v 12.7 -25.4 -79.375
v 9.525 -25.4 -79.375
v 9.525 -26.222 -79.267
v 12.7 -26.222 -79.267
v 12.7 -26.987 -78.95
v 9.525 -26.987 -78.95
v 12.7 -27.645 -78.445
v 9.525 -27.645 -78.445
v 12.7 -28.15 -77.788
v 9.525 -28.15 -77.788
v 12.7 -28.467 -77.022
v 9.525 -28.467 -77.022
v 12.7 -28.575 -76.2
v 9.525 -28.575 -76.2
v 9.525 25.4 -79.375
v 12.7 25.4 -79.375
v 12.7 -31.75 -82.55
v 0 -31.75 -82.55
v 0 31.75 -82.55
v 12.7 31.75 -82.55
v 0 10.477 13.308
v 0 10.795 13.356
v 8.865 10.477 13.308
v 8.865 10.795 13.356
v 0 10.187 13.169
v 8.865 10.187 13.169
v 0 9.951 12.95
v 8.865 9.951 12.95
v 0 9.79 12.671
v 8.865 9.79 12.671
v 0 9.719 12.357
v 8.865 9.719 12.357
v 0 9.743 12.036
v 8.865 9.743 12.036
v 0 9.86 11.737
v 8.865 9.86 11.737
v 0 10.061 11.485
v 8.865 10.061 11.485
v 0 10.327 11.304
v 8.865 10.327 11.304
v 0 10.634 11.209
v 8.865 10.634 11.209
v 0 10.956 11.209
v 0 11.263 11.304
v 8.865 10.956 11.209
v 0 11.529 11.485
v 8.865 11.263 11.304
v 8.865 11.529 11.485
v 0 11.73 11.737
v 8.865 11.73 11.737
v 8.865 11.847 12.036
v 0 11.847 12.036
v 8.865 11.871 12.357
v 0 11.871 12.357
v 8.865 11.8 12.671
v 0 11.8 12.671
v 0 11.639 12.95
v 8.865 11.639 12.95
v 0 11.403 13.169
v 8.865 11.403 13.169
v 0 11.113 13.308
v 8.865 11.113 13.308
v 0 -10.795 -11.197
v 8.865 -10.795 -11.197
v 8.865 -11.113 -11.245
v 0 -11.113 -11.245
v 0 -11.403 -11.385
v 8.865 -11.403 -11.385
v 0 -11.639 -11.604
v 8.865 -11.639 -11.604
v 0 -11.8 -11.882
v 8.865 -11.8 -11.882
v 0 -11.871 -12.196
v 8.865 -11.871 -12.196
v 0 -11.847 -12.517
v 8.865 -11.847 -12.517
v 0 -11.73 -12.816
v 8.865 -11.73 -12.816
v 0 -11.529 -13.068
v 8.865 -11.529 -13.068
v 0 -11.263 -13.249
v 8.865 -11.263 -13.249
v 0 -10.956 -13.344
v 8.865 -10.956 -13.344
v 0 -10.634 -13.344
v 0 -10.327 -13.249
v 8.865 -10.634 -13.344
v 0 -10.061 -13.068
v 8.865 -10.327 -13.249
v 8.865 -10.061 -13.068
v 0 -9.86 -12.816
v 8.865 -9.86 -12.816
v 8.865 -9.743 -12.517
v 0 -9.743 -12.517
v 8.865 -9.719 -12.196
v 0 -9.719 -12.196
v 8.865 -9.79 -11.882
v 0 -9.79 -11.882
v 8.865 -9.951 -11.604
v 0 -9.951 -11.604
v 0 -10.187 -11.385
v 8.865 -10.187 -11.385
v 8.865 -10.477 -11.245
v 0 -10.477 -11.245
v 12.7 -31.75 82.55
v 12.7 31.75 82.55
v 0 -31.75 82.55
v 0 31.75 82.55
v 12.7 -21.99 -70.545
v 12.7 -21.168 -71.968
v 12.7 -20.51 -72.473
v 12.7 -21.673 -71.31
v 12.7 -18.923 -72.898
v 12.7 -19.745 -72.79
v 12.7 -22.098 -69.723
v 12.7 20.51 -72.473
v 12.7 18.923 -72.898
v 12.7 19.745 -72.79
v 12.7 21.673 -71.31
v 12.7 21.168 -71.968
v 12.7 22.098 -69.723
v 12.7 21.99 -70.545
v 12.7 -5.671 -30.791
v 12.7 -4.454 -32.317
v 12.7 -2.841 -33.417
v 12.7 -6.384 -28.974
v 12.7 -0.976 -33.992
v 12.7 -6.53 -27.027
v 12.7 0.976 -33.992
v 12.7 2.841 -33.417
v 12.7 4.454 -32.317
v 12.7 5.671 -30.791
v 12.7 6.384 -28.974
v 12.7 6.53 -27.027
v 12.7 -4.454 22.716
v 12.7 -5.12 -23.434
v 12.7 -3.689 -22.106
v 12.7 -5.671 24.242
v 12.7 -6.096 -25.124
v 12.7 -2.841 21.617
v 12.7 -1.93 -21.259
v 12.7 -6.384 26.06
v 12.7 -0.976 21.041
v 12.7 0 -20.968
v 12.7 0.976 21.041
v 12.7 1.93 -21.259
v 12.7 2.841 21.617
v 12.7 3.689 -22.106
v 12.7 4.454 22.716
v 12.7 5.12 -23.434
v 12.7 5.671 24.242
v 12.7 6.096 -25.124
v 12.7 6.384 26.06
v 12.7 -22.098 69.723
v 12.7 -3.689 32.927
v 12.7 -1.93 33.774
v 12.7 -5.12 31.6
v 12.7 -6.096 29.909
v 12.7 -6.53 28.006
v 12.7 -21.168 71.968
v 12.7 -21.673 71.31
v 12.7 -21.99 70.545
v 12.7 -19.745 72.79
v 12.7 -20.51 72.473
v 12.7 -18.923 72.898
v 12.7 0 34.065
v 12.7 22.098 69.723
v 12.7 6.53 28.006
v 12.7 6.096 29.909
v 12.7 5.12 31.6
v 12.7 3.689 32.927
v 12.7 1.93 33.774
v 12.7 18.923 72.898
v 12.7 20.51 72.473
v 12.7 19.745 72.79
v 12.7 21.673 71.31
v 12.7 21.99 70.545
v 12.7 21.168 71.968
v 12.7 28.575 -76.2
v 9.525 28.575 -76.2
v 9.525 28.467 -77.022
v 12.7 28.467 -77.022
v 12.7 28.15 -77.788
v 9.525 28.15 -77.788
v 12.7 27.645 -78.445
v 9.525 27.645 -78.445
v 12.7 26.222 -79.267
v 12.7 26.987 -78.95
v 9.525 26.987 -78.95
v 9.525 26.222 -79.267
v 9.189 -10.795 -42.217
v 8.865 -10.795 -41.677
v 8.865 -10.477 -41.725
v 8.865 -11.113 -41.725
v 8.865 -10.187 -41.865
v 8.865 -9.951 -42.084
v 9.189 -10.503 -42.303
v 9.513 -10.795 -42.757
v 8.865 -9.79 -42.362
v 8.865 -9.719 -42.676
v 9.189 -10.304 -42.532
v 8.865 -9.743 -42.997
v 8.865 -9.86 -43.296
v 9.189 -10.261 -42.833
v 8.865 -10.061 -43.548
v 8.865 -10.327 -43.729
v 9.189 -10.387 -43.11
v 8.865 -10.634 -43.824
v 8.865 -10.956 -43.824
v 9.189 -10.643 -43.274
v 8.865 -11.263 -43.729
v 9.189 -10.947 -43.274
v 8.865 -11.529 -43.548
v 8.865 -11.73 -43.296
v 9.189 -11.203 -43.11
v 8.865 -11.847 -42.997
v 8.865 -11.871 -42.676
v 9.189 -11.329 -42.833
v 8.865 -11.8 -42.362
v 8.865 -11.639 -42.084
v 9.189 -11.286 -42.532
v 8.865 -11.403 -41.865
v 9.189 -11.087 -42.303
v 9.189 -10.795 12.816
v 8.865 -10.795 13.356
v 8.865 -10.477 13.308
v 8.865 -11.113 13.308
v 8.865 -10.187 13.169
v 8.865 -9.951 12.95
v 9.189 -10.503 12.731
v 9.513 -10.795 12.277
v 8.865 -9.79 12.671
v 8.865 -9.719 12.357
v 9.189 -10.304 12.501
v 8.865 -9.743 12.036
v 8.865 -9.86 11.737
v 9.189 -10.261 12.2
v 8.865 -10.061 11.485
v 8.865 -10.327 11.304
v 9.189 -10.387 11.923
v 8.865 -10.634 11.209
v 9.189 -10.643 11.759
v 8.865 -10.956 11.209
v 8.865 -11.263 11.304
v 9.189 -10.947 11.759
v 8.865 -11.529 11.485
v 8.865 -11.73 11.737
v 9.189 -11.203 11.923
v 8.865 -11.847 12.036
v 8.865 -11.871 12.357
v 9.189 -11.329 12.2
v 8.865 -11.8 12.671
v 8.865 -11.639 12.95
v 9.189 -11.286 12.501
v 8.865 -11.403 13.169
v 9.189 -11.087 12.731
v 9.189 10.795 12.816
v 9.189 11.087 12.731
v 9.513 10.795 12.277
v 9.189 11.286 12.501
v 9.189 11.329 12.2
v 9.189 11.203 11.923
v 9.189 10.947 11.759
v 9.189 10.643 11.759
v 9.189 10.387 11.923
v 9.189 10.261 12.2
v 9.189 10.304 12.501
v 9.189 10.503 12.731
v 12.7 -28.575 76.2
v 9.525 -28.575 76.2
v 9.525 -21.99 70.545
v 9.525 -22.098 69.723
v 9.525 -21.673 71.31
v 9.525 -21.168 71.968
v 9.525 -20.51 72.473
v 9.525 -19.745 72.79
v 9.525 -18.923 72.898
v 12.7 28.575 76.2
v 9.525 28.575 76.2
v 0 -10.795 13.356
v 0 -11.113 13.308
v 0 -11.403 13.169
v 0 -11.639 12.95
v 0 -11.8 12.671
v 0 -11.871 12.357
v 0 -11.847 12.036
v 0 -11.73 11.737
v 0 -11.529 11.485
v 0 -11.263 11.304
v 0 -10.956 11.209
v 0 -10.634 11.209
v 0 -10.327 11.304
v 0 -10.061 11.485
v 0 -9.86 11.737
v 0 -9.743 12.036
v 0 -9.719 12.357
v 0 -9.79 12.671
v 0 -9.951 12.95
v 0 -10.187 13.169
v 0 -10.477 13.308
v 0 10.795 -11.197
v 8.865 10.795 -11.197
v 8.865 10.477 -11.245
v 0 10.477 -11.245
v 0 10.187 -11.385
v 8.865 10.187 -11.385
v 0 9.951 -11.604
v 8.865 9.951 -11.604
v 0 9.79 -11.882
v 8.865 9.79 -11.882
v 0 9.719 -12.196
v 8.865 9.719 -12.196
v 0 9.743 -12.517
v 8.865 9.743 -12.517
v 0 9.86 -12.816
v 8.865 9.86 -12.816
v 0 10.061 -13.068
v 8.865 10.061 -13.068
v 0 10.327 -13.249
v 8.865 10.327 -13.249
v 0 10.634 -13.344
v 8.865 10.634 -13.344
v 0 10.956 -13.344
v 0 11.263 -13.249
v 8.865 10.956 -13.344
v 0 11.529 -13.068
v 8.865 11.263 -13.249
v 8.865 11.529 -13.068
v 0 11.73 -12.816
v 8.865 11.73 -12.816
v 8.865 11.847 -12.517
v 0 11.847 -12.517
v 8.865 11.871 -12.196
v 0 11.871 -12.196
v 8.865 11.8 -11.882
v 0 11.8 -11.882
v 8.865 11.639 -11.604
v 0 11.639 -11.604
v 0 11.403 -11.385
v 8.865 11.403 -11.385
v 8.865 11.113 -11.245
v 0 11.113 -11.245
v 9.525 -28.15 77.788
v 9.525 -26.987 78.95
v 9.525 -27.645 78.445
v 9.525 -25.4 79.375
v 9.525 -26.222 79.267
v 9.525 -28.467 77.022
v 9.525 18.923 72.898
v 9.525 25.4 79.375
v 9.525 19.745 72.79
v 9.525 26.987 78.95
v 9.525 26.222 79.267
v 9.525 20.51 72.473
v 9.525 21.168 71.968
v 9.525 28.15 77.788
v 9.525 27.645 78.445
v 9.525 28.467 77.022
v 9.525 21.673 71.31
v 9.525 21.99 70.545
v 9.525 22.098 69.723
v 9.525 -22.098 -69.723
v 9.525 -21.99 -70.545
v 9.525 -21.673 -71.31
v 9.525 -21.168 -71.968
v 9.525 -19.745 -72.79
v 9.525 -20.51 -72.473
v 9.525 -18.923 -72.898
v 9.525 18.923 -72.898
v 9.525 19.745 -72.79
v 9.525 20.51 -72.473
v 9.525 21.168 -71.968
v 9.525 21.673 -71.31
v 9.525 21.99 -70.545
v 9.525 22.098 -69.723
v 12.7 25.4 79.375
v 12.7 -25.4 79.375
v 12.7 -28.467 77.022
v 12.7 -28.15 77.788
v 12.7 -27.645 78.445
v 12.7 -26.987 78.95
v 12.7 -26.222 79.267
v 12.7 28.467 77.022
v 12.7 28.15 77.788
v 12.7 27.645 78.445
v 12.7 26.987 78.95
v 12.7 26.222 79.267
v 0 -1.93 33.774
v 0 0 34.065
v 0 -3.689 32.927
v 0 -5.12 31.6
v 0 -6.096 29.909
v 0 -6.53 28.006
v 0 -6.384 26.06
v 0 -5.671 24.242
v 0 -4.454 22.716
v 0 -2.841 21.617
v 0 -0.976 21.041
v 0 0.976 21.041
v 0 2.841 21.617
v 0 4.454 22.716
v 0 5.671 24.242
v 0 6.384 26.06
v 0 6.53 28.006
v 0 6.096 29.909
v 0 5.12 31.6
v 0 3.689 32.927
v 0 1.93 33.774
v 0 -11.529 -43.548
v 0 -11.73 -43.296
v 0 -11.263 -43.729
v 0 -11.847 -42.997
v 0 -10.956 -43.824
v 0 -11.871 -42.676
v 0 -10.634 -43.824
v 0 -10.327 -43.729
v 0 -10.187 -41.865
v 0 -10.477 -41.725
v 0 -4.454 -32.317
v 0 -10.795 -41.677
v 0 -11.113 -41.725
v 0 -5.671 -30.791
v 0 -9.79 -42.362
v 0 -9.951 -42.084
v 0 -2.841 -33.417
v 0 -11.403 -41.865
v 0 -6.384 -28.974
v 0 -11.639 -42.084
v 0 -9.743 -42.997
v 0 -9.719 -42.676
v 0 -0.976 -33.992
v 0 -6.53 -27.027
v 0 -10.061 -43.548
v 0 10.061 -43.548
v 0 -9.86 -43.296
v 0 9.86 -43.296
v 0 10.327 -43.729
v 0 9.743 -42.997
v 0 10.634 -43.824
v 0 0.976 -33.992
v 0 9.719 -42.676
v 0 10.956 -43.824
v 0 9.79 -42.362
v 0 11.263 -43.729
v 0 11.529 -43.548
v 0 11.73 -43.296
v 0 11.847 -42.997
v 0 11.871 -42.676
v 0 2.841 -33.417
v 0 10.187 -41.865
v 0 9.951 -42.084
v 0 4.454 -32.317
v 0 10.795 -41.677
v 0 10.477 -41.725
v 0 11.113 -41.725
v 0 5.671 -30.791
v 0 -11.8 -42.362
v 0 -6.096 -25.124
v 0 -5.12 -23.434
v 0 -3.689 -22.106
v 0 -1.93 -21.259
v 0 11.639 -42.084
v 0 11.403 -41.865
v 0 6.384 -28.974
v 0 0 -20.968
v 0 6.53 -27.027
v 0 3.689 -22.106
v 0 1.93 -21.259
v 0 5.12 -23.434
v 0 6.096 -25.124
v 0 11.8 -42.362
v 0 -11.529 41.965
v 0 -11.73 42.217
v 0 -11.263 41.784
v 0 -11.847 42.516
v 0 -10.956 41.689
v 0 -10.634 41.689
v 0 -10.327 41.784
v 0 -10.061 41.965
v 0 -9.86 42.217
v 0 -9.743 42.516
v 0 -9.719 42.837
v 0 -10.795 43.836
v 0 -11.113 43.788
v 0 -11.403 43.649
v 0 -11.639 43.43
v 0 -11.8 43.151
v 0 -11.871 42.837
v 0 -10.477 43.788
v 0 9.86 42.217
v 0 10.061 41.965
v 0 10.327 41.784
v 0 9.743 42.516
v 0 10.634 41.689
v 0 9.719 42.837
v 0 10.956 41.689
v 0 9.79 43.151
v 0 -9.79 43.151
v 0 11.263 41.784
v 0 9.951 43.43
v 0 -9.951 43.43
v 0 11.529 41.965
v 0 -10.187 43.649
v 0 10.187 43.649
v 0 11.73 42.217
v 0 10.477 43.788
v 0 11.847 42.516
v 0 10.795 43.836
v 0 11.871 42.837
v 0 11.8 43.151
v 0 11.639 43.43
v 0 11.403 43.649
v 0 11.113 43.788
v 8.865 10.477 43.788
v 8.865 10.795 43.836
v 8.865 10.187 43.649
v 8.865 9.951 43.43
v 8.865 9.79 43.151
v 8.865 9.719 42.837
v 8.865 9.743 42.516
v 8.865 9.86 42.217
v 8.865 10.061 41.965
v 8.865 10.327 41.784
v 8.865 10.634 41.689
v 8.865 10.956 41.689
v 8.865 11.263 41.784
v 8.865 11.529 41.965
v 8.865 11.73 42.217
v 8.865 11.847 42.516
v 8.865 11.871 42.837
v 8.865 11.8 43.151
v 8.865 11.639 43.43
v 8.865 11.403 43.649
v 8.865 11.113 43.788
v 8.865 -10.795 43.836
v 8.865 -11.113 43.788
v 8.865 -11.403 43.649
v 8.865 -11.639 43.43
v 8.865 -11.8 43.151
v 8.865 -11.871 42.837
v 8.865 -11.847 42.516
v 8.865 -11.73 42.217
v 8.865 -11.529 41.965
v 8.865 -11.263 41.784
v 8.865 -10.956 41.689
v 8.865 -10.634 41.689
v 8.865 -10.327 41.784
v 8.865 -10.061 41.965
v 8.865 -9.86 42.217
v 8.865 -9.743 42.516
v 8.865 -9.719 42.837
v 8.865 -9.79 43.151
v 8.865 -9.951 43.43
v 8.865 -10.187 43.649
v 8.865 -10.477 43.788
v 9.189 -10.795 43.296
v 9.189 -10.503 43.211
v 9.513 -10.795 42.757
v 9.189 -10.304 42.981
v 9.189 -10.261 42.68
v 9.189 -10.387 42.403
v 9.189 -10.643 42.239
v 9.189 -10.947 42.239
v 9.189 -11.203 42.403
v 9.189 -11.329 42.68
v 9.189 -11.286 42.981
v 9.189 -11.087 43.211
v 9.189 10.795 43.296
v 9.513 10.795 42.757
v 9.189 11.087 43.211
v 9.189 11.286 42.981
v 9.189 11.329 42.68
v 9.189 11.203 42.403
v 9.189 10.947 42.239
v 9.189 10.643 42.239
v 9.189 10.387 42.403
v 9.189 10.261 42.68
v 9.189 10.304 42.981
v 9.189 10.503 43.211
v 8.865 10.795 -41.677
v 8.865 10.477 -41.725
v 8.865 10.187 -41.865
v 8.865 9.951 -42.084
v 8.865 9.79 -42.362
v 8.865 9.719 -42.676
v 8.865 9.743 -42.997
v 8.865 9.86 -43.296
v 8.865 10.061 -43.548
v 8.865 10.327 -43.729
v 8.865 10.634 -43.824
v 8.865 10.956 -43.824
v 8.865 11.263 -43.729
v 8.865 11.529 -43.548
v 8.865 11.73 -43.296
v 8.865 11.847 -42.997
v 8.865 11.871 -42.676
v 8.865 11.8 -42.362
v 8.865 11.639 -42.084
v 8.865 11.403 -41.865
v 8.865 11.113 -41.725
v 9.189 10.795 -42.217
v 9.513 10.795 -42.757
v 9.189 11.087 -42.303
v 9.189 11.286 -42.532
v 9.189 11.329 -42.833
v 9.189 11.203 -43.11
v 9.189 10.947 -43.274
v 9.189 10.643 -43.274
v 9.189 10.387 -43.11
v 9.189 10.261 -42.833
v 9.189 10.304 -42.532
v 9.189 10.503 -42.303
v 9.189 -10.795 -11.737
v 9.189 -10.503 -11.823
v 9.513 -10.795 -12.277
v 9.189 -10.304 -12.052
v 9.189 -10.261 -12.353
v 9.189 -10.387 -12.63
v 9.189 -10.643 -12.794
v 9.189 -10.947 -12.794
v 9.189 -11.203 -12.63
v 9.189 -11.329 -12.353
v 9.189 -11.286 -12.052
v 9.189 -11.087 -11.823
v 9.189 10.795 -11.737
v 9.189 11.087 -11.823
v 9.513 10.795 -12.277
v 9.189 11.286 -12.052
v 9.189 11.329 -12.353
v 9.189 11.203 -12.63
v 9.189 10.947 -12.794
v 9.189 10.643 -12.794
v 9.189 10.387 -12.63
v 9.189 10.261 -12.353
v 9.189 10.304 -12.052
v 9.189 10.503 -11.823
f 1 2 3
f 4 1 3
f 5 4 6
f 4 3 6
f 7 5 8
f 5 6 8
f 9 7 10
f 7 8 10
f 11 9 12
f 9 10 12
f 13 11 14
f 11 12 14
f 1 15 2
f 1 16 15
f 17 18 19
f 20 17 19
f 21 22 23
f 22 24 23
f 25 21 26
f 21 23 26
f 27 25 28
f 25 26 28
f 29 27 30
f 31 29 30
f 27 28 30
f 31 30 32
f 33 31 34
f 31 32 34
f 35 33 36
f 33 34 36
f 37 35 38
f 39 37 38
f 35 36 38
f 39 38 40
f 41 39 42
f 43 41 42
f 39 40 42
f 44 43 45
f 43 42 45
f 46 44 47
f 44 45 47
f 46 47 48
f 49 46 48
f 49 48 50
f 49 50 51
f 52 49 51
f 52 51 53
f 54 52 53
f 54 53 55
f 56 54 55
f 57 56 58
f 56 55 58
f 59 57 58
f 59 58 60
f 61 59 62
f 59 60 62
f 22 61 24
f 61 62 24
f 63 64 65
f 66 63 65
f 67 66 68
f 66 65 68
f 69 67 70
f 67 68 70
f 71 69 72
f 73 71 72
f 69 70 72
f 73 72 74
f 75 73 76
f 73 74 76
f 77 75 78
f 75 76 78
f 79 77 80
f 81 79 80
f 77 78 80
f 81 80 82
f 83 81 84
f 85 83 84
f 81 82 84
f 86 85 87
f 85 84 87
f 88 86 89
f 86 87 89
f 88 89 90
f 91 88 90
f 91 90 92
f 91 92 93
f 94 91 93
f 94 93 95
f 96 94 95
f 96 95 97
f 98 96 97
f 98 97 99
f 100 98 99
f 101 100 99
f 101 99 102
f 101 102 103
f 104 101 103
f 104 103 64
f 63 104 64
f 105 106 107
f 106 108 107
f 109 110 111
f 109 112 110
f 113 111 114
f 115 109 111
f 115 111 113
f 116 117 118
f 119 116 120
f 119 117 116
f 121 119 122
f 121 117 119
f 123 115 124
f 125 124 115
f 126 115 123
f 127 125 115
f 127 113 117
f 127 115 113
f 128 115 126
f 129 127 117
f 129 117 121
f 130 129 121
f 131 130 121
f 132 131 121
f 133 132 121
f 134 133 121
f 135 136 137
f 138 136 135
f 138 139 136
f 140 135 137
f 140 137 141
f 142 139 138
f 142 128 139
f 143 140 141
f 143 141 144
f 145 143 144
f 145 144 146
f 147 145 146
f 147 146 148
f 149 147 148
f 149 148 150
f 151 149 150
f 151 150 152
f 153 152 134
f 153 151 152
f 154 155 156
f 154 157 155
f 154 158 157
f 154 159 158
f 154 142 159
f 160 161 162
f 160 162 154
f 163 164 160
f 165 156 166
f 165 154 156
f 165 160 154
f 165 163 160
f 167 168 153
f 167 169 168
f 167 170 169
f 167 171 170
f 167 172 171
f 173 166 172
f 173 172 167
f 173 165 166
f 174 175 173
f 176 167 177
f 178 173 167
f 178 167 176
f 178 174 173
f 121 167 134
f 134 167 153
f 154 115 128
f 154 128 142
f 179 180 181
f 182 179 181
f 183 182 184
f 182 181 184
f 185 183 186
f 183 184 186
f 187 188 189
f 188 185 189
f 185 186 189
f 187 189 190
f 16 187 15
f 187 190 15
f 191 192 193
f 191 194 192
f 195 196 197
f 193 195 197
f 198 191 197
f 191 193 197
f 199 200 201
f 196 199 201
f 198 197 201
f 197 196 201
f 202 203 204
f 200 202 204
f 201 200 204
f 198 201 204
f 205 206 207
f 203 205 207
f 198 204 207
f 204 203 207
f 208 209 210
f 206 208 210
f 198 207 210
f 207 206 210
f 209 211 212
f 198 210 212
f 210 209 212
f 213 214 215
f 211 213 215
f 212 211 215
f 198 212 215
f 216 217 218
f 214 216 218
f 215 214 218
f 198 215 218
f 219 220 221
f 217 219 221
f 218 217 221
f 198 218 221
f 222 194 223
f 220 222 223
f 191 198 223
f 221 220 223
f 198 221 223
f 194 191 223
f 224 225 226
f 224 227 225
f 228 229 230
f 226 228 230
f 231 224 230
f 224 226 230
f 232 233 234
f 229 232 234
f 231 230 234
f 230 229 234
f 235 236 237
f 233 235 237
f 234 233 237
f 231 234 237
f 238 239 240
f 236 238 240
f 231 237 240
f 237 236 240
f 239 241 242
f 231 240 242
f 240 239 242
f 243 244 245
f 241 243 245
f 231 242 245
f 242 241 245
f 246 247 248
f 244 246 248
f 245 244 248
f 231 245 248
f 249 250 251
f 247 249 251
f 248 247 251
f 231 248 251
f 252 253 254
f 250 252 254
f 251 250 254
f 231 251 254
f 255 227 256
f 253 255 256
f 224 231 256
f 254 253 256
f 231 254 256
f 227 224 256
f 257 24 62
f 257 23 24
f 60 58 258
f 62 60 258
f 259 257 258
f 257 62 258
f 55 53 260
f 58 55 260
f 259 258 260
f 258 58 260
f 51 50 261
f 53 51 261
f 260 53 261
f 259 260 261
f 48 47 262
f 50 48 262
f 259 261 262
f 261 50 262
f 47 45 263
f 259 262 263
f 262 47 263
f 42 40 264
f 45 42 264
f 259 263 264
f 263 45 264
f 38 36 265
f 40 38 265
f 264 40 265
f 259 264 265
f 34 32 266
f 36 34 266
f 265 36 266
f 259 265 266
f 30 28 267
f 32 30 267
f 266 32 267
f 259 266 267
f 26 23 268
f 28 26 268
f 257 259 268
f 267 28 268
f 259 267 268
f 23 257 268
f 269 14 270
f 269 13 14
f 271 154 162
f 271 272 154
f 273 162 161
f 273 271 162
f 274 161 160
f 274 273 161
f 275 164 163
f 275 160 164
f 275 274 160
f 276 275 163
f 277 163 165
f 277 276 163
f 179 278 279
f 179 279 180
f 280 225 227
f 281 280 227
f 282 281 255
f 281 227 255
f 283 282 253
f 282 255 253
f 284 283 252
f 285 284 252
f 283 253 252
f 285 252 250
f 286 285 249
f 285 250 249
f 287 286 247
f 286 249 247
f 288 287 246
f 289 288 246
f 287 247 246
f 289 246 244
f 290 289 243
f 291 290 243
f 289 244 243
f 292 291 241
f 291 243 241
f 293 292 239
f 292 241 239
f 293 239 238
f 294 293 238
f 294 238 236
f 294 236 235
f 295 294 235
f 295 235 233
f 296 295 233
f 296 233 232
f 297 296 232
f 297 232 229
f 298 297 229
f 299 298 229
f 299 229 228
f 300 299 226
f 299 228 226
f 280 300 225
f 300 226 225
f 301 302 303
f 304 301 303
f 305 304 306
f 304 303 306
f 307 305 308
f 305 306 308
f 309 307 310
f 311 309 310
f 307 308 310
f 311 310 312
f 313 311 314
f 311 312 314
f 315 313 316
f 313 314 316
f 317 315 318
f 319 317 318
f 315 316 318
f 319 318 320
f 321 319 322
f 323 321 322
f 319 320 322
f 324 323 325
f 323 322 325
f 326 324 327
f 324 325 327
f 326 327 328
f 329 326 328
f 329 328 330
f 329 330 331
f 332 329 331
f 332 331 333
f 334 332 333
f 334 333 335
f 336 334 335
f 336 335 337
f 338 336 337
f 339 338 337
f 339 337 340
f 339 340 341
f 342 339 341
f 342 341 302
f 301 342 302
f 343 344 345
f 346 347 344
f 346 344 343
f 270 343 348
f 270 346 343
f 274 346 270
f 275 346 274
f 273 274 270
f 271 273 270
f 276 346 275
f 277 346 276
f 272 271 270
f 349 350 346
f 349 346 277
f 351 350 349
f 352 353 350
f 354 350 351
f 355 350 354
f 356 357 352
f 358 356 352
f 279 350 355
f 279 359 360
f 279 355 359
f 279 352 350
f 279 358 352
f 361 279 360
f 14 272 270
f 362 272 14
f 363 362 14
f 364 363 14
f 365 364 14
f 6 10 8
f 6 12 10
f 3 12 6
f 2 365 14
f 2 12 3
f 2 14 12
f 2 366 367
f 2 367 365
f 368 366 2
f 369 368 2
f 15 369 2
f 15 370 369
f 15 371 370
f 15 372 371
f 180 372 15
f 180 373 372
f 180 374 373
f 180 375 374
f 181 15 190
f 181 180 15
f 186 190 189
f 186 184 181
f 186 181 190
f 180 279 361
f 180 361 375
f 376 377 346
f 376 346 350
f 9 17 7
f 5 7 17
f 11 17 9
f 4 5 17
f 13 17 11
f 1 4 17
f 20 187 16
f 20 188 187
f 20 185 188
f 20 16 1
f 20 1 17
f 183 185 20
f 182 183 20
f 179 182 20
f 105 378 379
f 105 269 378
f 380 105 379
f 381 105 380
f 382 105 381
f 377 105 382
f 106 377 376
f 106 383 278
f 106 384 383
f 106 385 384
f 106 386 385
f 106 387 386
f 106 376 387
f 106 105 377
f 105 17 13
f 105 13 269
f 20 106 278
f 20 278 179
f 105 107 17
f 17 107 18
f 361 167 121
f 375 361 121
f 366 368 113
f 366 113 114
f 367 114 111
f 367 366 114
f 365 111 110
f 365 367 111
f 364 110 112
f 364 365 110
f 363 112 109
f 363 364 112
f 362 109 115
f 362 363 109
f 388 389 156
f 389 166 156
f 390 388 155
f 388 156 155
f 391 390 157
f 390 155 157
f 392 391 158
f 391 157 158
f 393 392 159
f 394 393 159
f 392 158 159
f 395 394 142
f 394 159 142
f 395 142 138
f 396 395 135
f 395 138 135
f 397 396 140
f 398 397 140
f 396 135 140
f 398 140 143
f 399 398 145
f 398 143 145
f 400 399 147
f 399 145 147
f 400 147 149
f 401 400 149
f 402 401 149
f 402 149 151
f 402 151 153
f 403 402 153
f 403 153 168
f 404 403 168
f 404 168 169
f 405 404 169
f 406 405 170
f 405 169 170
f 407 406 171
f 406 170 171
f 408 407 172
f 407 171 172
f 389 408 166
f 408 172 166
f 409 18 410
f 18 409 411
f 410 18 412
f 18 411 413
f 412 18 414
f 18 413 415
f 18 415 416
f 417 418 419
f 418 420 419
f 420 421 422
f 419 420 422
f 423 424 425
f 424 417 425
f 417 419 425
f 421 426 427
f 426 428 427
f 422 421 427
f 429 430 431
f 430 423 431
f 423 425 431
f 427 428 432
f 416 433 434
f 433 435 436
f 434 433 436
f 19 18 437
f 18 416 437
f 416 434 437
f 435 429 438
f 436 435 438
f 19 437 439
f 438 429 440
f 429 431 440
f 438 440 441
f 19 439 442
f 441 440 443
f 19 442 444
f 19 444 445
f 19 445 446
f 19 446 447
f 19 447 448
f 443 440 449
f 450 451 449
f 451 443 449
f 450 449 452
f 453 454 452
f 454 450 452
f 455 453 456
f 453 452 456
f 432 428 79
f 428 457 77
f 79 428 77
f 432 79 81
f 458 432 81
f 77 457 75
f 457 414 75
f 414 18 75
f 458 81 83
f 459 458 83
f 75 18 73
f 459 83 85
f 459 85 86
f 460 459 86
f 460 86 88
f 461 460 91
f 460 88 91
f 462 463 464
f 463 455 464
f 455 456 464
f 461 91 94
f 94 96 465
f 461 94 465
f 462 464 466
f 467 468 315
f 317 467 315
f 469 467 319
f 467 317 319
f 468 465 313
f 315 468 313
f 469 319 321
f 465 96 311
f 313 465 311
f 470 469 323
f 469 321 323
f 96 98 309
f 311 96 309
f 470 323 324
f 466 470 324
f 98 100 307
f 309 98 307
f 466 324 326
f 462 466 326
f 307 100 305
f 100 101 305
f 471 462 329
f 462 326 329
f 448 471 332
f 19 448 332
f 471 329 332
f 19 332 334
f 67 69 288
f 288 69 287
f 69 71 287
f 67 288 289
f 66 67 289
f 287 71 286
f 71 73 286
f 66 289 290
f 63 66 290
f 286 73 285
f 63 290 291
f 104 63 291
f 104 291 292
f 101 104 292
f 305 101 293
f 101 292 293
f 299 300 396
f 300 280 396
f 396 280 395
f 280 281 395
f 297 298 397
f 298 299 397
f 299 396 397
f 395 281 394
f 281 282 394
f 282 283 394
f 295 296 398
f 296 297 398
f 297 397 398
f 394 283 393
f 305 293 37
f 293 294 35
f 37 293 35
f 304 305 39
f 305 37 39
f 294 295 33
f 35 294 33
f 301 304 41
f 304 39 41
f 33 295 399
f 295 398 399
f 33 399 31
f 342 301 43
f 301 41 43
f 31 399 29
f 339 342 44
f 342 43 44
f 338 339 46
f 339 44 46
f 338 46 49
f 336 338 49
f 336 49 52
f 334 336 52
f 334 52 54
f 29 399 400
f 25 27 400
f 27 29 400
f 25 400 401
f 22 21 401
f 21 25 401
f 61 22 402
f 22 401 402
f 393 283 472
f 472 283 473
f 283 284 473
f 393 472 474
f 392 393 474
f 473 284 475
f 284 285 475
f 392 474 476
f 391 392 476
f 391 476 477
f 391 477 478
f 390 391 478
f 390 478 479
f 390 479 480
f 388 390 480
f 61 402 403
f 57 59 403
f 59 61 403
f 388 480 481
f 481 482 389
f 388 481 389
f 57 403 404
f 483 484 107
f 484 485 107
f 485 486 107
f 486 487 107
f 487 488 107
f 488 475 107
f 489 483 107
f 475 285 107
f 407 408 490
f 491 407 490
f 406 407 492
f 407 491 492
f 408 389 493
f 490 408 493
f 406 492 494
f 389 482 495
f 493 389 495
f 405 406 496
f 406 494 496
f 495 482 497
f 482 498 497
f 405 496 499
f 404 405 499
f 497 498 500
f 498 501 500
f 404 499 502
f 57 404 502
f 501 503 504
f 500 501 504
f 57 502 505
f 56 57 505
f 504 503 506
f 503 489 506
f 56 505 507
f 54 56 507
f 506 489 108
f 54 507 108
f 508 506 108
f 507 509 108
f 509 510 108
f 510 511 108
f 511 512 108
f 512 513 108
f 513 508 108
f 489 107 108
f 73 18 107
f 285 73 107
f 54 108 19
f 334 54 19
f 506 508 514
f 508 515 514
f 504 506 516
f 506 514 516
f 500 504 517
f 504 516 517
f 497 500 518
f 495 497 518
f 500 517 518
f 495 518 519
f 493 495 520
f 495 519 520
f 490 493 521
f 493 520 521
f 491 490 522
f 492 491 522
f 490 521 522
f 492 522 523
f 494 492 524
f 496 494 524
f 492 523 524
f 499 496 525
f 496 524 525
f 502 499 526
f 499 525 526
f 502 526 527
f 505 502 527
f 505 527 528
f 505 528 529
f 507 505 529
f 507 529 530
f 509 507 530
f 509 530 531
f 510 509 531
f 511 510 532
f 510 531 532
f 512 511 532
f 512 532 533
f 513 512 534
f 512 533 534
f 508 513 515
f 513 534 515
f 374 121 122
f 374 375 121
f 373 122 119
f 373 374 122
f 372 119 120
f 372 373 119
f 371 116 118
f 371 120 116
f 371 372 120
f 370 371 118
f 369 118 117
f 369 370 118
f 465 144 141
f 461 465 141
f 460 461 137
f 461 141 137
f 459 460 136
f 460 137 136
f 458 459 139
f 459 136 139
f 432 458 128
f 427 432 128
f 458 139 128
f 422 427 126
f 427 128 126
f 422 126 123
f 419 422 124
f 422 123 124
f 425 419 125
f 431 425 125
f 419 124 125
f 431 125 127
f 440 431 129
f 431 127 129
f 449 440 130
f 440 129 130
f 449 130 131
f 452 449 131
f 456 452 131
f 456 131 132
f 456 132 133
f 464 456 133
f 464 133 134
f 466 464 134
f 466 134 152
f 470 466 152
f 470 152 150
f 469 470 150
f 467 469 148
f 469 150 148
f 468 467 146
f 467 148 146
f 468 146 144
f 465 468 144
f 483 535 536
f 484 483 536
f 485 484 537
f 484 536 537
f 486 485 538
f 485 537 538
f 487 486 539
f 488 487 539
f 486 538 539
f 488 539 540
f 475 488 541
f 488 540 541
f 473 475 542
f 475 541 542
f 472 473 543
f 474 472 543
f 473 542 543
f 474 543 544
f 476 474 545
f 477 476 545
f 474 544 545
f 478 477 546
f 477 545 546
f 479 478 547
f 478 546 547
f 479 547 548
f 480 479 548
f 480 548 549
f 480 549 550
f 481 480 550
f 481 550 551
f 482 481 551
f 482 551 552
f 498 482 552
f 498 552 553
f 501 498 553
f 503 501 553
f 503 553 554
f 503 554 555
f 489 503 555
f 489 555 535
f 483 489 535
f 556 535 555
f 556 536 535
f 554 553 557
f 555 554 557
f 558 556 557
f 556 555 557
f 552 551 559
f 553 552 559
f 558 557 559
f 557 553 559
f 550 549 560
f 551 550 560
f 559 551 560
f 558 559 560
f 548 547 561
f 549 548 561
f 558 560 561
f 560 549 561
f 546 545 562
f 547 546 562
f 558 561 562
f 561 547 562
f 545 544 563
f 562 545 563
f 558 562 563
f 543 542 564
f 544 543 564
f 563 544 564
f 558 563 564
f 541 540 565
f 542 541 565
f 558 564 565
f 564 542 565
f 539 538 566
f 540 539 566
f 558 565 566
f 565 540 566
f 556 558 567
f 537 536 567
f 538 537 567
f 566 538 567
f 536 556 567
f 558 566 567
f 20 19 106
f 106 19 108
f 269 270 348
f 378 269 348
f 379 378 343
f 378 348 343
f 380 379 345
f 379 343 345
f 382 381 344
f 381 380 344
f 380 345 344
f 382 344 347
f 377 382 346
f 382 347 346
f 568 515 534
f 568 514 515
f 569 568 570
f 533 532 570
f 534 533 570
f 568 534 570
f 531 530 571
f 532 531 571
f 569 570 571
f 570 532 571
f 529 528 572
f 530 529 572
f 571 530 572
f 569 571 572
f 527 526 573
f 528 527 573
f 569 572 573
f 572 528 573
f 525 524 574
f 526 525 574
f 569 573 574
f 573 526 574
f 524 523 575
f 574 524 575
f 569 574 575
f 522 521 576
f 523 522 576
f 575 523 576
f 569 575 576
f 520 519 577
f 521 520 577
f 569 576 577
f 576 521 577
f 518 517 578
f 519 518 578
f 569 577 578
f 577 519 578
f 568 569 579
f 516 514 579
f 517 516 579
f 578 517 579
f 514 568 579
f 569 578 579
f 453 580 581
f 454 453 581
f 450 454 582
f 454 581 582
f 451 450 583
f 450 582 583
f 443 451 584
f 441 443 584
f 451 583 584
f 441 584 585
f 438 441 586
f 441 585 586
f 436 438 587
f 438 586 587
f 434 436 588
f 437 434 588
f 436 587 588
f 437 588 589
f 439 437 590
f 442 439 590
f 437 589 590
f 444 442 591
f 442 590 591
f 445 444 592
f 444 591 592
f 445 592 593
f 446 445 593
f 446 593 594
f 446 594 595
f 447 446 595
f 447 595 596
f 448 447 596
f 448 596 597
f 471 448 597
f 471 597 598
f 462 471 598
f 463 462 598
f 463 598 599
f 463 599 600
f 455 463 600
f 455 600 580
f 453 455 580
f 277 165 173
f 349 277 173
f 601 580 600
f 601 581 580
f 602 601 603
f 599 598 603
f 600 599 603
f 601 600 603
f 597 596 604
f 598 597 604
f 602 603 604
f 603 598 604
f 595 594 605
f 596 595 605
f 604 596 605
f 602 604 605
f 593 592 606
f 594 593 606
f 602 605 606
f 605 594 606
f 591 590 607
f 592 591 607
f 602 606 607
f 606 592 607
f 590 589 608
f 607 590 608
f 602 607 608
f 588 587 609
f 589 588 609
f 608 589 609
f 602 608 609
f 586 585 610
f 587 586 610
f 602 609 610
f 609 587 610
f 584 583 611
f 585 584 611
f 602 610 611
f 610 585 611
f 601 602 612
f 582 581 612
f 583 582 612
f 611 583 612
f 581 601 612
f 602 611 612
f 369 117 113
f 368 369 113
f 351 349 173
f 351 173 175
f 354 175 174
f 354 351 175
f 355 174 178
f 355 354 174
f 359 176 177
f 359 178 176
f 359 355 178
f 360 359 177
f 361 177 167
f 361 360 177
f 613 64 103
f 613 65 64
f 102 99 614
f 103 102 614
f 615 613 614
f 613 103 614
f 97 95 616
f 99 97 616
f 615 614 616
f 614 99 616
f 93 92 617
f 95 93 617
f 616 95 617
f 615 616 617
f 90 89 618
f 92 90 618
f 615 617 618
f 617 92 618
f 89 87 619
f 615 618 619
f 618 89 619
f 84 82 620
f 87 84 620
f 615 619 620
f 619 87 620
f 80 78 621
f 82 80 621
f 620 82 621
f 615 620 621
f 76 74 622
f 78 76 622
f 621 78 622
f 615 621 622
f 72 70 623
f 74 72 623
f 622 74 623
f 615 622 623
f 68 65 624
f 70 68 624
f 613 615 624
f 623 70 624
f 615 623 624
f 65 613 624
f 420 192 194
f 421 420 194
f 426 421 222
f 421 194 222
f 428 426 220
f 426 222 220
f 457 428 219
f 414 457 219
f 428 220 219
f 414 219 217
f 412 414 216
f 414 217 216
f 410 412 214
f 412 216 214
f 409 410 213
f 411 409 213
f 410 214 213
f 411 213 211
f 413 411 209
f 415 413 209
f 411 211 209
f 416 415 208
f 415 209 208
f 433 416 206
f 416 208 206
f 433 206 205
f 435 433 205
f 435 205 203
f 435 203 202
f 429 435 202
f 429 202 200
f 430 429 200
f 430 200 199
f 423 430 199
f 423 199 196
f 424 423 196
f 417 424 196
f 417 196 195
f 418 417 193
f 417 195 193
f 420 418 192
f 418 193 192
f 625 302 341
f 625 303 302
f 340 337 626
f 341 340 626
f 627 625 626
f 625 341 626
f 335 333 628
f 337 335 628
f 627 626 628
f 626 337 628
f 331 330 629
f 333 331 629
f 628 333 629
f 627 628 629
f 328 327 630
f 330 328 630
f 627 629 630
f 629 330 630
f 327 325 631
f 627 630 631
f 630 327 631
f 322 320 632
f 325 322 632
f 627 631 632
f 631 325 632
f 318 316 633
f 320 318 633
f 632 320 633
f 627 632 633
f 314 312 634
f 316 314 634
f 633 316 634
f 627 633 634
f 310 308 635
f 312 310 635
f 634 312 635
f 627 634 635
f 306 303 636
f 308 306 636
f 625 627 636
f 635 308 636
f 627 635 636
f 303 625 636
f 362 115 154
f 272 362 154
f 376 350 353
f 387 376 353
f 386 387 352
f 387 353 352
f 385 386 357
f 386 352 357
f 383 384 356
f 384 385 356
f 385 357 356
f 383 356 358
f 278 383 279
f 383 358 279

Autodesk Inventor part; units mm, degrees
ref_plane "YZ Plane" through (0, 0, 0) normal (1, 0, 0) x (0, 1, 0)
ref_plane "XZ Plane" through (0, 0, 0) normal (0, 1, 0) x (-1, 0, 0)
ref_plane "XY Plane" through (0, 0, 0) normal (0, 0, 1) x (1, 0, 0)
sketch "Sketch1" plane through (0, 0, 0) normal (1, 0, 0) x (0, 1, 0)
  line L0 (31.75, 82.55) -> (-31.75, 82.55)
  line L1 (-31.75, 82.55) -> (-31.75, -82.55)
  line L2 (-31.75, -82.55) -> (31.75, -82.55)
  line L3 (31.75, -82.55) -> (31.75, 82.55)
  point P0 (0, 0)
  point P1 (31.75, 0)
  point P2 (0, 82.55)
  dimension "d0" = 165.1
  dimension "d1" = 63.5
extrude "Extrusion1" add sketch "Sketch1" along normal blind 12.7
sketch "Sketch3" plane through (12.7, 0, 0) normal (1, 0, 0) x (0, 0, -1)
  line L0 (72.898, -22.098) -> (-72.898, -22.098)
  line L1 (-72.898, -22.098) -> (-72.898, 22.098)
  line L2 (-72.898, 22.098) -> (72.898, 22.098)
  line L3 (72.898, 22.098) -> (72.898, -22.098)
  line L4 (72.898, -22.098) -> (-72.898, 22.098) construction
  line L5 (-72.898, -22.098) -> (72.898, 22.098) construction
  line L6 (79.375, -28.575) -> (-79.375, -28.575)
  line L7 (-79.375, -28.575) -> (-79.375, 28.575)
  line L8 (-79.375, 28.575) -> (79.375, 28.575)
  line L9 (79.375, 28.575) -> (79.375, -28.575)
  line L10 (79.375, -28.575) -> (-79.375, 28.575) construction
  line L11 (-79.375, -28.575) -> (79.375, 28.575) construction
  point P0 (0, 0)
  point P1 (0, 0)
  point P2 (0, 0)
  dimension "d16" = 145.796
  dimension "d17" = 44.196
  dimension "d18" = 6.477
  dimension "d19" = 6.477
extrude "Extrusion3" cut sketch "Sketch3" against normal blind 3.175
fillet "Fillet1" radius 3.175 8 edges at (11.1125, -28.575, 79.375) (11.1125, 28.575, 79.375) (11.1125, 28.575, -79.375) (11.1125, -28.575, -79.375) (11.1125, -22.098, 72.898) (11.1125, 22.098, 72.898) (11.1125, 22.098, -72.898) (11.1125, -22.098, -72.898)
sketch "Sketch4" plane through (0, 0, 0) normal (-1, 0, 0) x (0, 0, 1)
  line L0 (0, 0) -> (27.5167, 0) construction
  line L1 (82.55, 31.75) -> (82.55, -31.75) projected
  dimension "d42" = 55.0333
hole "Hole1" at (0, 0, 27.5167) direction (1, 0, 0) diameter 13.0969 end through all
sketch "Sketch5" plane through (0, 0, 0) normal (-1, 0, 0) x (0, 0, 1)
  circle A0 centre (27.5167, 0) radius 6.5484 projected
  line L0 (42.7567, 10.795) -> (12.2767, 10.795) construction
  line L1 (12.2767, 10.795) -> (12.2767, -10.795) construction
  line L2 (12.2767, -10.795) -> (42.7567, -10.795) construction
  line L3 (42.7567, -10.795) -> (42.7567, 10.795) construction
  line L4 (42.7567, 10.795) -> (12.2767, -10.795) construction
  line L5 (12.2767, 10.795) -> (42.7567, -10.795) construction
  point P0 (0, 0)
  dimension "d30" = 30.48
  dimension "d31" = 21.59
hole "Hole2" at (0, -10.795, 42.7567) at (0, 10.795, 42.7567) at (0, 10.795, 12.2767) at (0, -10.795, 12.2767) direction (1, 0, 0) diameter 2.159 depth 8.8646 tip angle 118
pattern_linear "Rectangular Pattern1" count 2 spacing 55.0333 along (0, 0, -1) of "Hole1", "Hole2"
equation "\"d0\" = tubeWidth + 2 * plateOverhang"
equation "\"d1\" = tubeHeight + 2 * plateOverhang"
equation "\"d2\" = sensorCapThickness"
equation "\"d16\" = -2 * tubeWallThickness + tubeWidth - 2 * tubePlateClearance"
equation "\"d17\" = -2 * tubeWallThickness + tubeHeight - 2 * tubePlateClearance"
equation "\"d18\" = tubeWallThickness + tubePlateClearance + moatWidth"
equation "\"d19\" = tubeWallThickness + tubePlateClearance + moatWidth"
equation "\"d12\" = moatDepth"
equation "\"d23\" = glassTubeDiameter + 2 * glassTubeClearance"
equation "\"d30\" = longHoleSpacing"
equation "\"d31\" = shortHoleSpacing"
equation "\"tubeHeight\" = 50.8"
equation "\"tubeWidth\" = 152.4"
equation "\"tubeLength\" = 304.8"
equation "\"tubeWallThickness\" = 3.175"
equation "\"plateOverhang\" = 6.35"
equation "\"moatWidth\" = 3.175"
equation "\"tubePlateClearance\" = 0.127"
equation "\"moatDepth\" = 3.175"
equation "\"blankCapThickness\" = 9.525"
equation "\"sensorCapThickness\" = 12.7"
equation "\"glassTubeDiameter\" = 12.7"
equation "\"glassTubeClearance\" = 0.19844"
equation "\"shortHoleSpacing\" = 21.59"
equation "\"longHoleSpacing\" = 30.48"
equation "\"oRingGrooveWidth\" = 2.54"
equation "\"oRingGrooveDepth\" = 1.2446"
equation "\"fiberDiameter\" = 1"
equation "\"sensorHolderDiameter\" = 50.8"
equation "\"oRingID\" = 22.2504"
equation "\"sensorHolderThickness\" = 12.7"
equation "\"fiberClearance\" = 0"
equation "\"glassTubeLength\" = 279.4"
equation "\"glassTubeID\" = 7.874"
equation "\"sensorBoardHoleSpacing\" = 19"
properties part number "plateEnd" material "Aluminum 6061"
